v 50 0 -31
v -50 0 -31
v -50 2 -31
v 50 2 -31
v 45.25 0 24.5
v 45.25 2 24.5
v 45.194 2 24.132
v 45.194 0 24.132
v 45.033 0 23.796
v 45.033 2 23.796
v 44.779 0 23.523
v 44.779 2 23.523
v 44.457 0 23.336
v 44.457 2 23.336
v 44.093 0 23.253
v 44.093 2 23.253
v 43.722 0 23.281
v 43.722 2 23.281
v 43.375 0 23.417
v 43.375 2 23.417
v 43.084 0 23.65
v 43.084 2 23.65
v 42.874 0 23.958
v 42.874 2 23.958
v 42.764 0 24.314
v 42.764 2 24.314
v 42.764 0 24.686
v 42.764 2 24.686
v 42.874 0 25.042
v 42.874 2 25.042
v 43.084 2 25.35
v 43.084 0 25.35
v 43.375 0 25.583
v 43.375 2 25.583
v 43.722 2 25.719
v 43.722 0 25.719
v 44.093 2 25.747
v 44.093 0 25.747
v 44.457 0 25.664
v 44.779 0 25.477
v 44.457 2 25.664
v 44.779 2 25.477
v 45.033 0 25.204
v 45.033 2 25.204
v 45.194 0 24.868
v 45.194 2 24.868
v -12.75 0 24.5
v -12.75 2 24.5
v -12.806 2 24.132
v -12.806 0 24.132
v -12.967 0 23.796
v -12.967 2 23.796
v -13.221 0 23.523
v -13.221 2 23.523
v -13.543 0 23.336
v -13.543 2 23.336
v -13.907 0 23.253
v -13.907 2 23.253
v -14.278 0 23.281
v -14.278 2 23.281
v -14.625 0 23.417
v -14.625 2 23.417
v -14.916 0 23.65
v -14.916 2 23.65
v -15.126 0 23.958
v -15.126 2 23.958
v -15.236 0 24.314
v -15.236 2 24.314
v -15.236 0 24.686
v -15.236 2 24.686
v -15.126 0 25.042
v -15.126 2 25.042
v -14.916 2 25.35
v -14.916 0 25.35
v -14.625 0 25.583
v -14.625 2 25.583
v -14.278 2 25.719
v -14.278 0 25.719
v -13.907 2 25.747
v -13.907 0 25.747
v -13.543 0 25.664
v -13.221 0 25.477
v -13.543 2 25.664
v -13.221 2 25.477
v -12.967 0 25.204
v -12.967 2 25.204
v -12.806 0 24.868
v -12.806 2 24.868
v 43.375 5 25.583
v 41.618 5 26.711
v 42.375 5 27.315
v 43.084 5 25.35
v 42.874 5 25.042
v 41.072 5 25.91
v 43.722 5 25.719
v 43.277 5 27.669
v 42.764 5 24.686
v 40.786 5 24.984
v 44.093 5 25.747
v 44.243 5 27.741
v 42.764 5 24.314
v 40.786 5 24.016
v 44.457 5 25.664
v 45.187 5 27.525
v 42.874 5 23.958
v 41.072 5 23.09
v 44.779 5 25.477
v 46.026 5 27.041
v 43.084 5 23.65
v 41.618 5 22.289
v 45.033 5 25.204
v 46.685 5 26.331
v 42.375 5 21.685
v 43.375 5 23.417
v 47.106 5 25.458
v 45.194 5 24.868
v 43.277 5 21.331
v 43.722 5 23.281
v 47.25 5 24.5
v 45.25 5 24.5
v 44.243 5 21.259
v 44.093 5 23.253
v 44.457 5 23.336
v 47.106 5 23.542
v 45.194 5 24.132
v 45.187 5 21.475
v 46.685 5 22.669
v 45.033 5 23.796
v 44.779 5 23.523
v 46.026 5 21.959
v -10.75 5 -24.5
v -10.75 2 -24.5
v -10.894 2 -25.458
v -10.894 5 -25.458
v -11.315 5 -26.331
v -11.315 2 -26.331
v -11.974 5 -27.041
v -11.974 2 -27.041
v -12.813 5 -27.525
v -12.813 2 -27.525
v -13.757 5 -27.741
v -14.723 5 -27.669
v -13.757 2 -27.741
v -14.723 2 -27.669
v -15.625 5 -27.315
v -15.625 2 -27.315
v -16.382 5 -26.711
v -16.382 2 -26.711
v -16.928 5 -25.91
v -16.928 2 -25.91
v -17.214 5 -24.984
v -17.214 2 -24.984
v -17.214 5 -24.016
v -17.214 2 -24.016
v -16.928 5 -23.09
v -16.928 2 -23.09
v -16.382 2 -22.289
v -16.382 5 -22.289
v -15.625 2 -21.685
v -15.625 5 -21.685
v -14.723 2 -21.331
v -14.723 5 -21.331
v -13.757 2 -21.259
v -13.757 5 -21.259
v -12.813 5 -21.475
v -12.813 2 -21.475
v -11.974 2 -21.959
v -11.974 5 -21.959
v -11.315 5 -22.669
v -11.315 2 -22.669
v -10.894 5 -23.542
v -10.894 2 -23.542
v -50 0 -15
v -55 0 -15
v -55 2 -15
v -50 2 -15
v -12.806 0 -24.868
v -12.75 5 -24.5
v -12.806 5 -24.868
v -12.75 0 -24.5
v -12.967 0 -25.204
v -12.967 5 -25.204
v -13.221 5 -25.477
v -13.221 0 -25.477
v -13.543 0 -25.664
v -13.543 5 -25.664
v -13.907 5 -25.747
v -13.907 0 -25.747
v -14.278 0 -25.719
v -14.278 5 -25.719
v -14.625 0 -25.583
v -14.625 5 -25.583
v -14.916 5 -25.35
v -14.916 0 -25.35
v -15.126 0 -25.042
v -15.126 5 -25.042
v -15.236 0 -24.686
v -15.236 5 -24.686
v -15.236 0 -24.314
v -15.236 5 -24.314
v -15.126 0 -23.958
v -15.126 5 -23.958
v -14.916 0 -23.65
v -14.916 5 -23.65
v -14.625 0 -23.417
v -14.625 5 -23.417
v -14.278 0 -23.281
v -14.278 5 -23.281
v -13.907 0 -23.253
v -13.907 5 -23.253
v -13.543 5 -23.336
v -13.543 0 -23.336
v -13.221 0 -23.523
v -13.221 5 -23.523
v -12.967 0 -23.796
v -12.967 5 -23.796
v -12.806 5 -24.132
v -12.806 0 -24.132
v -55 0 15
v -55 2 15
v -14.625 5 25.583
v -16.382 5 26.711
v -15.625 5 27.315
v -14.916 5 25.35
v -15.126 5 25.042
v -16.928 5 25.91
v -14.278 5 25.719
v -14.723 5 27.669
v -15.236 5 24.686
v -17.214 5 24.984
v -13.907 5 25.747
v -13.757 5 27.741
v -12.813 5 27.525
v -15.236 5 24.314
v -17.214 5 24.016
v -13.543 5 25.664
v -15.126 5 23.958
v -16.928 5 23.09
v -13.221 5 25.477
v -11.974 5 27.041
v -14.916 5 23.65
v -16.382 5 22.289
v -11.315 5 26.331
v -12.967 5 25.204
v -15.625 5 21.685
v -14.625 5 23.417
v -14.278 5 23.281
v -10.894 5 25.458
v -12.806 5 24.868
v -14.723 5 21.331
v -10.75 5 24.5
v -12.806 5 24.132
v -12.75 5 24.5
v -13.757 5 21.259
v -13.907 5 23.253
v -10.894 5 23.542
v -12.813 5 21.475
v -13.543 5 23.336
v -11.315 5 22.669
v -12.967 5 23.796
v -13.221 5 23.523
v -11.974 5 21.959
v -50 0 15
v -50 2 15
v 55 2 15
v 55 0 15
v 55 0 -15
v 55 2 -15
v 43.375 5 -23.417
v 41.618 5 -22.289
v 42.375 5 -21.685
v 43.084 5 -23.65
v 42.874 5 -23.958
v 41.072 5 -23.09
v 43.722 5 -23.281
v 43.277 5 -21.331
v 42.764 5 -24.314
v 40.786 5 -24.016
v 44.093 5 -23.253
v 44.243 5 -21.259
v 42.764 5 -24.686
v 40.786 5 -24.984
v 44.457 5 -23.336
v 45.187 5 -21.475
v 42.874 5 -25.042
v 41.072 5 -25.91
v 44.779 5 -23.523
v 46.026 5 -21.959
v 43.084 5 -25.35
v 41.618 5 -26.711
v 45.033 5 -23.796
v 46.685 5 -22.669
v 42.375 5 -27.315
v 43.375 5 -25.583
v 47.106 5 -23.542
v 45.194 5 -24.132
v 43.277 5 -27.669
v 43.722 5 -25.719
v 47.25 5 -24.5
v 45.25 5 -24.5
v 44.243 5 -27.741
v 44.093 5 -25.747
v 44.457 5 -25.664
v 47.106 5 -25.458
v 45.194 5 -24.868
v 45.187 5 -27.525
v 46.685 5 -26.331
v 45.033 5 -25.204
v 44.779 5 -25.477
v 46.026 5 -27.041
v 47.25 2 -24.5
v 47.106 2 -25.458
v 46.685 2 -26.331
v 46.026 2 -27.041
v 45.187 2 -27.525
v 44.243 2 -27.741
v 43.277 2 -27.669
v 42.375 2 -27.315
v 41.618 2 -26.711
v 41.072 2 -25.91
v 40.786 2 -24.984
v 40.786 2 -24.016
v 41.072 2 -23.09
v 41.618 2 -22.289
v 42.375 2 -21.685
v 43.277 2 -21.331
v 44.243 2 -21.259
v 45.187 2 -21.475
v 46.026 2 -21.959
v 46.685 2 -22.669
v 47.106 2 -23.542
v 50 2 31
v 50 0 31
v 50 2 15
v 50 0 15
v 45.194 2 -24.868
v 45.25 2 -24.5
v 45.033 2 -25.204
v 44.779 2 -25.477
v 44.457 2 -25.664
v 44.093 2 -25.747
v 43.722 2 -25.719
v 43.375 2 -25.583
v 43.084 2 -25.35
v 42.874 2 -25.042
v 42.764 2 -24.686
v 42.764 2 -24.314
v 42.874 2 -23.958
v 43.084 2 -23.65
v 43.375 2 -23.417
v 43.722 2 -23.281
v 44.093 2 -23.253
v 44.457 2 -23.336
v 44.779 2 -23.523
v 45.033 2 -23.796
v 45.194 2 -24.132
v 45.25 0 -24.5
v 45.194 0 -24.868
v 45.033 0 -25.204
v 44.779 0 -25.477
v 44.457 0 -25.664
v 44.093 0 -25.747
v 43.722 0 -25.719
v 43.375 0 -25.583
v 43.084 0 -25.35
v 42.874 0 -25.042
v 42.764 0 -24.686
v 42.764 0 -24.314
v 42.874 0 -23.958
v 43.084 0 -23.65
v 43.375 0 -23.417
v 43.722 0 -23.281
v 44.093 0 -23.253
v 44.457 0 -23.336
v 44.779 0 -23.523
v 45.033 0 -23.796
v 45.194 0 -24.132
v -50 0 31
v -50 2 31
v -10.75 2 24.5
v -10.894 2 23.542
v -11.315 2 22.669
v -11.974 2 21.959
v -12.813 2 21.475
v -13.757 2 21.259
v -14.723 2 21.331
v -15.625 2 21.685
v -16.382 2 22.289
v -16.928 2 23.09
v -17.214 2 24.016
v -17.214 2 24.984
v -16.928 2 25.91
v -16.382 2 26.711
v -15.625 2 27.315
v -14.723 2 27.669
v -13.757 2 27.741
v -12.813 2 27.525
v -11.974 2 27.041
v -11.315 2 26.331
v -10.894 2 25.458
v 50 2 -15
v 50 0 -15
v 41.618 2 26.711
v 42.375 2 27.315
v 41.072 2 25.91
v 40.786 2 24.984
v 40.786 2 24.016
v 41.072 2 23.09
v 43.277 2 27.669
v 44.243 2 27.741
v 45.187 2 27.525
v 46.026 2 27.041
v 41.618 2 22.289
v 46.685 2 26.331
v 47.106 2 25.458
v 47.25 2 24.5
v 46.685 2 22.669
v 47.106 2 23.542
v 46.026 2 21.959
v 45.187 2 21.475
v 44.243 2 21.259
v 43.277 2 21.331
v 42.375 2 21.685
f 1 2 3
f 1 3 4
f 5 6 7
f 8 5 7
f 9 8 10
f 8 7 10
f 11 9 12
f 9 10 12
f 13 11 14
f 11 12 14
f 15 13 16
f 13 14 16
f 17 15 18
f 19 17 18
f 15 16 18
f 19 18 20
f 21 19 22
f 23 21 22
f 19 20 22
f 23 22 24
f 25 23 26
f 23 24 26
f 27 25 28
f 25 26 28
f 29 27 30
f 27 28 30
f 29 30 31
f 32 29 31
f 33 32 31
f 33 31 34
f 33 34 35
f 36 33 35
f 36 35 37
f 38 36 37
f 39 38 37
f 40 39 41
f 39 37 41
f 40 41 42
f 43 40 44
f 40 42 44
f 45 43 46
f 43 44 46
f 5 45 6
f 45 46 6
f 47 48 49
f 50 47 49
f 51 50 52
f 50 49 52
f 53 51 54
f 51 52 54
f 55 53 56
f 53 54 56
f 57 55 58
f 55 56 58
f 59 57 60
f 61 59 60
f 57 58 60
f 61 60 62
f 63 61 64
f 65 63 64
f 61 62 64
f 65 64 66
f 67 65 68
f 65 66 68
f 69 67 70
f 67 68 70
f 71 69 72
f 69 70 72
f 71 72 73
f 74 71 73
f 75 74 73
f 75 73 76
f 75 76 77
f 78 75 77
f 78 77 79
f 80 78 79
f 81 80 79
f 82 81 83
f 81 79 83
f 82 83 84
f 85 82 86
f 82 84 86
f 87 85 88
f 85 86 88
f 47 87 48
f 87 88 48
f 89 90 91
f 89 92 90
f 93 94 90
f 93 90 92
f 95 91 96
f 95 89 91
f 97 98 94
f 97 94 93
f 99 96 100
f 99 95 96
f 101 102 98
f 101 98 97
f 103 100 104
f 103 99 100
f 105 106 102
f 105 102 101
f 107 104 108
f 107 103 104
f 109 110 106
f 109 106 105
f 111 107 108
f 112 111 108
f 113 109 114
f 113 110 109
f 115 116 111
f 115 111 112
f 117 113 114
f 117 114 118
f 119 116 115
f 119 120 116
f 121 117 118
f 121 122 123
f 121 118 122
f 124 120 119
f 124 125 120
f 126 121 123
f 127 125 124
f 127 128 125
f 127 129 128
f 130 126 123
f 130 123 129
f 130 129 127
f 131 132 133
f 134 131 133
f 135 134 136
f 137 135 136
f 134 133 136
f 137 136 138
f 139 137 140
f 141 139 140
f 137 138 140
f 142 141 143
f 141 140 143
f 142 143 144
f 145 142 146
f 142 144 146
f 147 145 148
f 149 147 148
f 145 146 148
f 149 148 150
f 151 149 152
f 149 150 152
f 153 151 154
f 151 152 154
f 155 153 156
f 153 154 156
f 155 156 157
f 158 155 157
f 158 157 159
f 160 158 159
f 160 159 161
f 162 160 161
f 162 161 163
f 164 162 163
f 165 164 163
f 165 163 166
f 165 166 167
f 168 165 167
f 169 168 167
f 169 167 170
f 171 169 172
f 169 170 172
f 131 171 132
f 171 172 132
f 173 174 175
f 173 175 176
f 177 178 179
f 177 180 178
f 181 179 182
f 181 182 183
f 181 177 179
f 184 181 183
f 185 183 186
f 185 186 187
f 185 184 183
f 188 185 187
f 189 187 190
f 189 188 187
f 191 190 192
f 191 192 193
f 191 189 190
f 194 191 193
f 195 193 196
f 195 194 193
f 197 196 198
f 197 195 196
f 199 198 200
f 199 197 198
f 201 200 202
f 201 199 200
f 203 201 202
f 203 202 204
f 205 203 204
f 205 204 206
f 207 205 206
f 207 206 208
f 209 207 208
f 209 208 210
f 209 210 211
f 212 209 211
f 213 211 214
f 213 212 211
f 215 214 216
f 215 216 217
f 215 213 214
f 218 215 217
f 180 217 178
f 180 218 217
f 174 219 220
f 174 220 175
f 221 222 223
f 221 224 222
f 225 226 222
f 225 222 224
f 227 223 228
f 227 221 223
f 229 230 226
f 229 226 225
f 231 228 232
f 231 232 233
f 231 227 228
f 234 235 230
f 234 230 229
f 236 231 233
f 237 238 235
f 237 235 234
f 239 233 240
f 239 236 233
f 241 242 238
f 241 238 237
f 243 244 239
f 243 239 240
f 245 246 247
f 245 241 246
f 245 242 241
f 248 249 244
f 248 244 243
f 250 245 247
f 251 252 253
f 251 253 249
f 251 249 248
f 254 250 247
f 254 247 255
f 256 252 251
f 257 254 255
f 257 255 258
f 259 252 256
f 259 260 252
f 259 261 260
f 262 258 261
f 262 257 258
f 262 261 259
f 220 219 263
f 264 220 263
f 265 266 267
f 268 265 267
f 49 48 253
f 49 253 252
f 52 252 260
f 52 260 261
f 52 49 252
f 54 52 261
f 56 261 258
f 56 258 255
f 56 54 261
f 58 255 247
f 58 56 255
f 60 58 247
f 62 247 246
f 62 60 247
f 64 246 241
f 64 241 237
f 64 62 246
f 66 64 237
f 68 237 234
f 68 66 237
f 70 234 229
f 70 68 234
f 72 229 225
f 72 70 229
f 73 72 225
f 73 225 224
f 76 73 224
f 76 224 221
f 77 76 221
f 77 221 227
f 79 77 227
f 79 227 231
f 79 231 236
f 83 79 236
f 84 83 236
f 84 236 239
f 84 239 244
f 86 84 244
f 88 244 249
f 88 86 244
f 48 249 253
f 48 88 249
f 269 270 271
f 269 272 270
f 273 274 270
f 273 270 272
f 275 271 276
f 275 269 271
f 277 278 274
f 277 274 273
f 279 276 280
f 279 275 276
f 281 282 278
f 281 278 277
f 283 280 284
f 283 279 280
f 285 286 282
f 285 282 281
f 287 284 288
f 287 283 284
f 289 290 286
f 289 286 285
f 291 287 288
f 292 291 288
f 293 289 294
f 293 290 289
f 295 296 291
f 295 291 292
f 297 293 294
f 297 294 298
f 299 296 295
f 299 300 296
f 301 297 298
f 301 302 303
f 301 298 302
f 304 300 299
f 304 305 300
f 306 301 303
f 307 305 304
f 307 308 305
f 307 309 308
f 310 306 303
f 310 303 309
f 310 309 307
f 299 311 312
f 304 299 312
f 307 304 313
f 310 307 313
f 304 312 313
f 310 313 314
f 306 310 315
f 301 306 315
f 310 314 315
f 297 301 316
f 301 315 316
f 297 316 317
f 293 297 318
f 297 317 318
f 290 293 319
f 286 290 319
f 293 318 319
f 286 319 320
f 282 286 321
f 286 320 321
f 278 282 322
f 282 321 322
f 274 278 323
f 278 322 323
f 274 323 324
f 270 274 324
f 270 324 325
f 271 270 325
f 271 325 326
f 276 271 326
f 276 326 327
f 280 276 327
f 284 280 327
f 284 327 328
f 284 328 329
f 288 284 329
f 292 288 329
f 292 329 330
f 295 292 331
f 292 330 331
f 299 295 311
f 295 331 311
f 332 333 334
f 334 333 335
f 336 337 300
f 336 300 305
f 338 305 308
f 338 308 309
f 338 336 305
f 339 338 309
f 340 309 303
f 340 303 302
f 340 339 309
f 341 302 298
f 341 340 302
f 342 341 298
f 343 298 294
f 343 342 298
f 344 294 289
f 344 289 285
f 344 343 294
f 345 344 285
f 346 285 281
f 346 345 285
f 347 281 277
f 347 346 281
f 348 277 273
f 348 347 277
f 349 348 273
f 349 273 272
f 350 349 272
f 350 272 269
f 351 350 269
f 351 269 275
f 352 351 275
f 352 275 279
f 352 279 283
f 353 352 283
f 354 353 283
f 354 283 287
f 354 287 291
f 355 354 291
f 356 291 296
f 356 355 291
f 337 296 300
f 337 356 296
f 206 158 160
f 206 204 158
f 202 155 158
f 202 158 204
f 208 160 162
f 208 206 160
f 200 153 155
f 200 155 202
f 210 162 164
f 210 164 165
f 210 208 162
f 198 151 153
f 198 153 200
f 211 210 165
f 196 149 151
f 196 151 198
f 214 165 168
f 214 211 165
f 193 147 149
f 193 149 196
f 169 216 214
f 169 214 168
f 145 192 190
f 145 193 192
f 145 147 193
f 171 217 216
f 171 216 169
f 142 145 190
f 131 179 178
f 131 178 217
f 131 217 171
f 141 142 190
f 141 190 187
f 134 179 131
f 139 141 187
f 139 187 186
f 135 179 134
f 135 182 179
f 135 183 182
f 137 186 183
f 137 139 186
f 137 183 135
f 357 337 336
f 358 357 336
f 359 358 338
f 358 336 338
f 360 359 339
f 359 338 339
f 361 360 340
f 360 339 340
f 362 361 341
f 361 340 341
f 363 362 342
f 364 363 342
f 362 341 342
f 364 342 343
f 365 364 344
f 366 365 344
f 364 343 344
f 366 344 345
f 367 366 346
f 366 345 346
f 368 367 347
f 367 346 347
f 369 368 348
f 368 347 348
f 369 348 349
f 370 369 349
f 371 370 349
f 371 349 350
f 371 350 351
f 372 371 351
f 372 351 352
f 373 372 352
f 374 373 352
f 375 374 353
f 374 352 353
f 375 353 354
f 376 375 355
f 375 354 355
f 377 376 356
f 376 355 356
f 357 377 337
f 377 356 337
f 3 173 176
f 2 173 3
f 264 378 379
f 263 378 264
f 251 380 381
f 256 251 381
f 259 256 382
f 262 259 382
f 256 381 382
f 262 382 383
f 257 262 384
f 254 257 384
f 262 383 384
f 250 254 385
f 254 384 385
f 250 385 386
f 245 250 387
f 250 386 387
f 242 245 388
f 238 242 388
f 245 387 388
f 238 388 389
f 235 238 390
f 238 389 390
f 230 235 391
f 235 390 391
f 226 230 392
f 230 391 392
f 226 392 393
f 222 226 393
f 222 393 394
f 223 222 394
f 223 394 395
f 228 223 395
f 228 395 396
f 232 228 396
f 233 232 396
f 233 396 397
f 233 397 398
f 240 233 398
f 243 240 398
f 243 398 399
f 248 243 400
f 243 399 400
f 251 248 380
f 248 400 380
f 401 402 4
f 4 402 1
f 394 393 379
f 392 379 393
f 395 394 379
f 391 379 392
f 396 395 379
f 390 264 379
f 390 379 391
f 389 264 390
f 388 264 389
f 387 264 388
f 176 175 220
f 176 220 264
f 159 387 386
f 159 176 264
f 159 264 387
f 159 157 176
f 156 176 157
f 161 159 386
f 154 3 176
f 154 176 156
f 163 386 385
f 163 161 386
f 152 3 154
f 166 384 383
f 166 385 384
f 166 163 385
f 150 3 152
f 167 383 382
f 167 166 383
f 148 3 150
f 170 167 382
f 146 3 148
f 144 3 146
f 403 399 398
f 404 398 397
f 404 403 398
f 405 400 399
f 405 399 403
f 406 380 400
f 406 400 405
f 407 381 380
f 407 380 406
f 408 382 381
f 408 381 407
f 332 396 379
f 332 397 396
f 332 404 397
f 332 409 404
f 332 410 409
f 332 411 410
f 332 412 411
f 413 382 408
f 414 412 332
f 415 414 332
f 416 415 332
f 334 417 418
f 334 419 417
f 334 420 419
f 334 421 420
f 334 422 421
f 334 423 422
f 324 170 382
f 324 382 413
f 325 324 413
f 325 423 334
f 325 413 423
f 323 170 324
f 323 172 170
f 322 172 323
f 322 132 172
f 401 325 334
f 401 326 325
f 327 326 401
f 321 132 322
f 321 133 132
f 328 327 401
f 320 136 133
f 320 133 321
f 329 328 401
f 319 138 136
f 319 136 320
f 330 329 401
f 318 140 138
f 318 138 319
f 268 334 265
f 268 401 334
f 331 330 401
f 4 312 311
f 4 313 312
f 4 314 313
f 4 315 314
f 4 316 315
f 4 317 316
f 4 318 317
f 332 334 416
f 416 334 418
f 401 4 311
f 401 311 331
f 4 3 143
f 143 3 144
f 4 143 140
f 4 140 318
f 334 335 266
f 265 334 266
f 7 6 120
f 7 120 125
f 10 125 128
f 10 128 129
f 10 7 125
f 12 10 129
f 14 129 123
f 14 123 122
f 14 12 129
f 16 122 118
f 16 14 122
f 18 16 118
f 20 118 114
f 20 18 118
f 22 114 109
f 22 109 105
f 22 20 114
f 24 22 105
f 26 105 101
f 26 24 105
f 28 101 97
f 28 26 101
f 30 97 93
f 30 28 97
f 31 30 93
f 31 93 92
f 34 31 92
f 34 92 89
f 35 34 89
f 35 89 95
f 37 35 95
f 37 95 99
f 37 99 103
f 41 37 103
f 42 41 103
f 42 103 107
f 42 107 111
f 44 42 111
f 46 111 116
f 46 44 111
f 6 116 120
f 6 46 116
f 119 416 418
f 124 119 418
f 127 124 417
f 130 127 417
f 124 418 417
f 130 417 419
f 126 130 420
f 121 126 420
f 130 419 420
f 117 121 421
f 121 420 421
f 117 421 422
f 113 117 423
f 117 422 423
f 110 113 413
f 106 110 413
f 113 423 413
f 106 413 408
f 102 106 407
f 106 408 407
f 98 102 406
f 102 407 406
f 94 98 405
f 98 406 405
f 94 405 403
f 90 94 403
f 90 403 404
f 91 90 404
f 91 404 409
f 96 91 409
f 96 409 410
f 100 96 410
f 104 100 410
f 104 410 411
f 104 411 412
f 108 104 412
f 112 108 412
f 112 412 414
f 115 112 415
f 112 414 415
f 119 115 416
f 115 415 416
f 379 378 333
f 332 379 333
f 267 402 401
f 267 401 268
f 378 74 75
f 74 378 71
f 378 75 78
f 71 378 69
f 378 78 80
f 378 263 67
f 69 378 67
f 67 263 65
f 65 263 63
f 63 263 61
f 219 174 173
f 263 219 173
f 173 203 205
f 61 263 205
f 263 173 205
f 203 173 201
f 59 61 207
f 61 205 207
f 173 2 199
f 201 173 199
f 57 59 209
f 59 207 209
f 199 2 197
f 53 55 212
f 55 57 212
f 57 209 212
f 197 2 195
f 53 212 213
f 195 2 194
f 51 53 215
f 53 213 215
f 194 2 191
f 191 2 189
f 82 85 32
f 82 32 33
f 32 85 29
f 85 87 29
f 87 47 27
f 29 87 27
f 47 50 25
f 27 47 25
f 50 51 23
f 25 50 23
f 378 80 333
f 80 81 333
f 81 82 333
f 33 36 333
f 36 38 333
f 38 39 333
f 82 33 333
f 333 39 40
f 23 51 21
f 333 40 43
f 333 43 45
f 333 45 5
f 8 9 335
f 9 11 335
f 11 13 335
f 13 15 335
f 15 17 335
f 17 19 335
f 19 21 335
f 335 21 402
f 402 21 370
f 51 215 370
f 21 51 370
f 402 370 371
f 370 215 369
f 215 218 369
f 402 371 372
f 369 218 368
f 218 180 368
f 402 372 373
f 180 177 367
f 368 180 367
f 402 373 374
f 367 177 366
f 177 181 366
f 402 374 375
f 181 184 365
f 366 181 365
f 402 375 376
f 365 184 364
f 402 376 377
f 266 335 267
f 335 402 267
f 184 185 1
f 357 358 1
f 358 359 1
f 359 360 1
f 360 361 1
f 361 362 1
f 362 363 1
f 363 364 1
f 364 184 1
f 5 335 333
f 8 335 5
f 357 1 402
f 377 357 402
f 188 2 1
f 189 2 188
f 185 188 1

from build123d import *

# Parameters (mm, degrees)
SKETCH_1_W            = 100
SKETCH_1_H            = 62
SKETCH_1_W_2          = 110
SKETCH_1_H_2          = 30
EXTRUDE_467_DEPTH     = 2
SKETCH_2_R            = 1.25
CUT_EXTRUDE_872_DEPTH = 2
SKETCH_3_R            = 3.25
SKETCH_3_R_2          = 1.25
EXTRUDE_1188_DEPTH    = 3


with BuildPart() as part:
    # 草图1 → Extrude 467 (new body)
    with BuildSketch(Plane(origin=(0, 0, 0), x_dir=(1, 0, 0), z_dir=(0, 1, 0))):
        Rectangle(SKETCH_1_W, SKETCH_1_H)
        Rectangle(SKETCH_1_W_2, SKETCH_1_H_2)
    extrude(amount=EXTRUDE_467_DEPTH)

    # 草图2 → Cut-Extrude 872 (cut)
    with BuildSketch(Plane(origin=(0, 2, 0), x_dir=(1, 0, 0), z_dir=(0, 1, 0))):
        with Locations((-14, 24.5)):
            Circle(SKETCH_2_R)
        with Locations((44, 24.5)):
            Circle(SKETCH_2_R)
        with Locations((-14, -24.5)):
            Circle(SKETCH_2_R)
        with Locations((44, -24.5)):
            Circle(SKETCH_2_R)
    extrude(amount=-CUT_EXTRUDE_872_DEPTH, mode=Mode.SUBTRACT)

    # 草图3 → Extrude 1188 (add)
    with BuildSketch(Plane(origin=(0, 2, 0), x_dir=(1, 0, 0), z_dir=(0, 1, 0))):
        with Locations((-14, 24.5)):
            Circle(SKETCH_3_R)
        with Locations((-14, 24.5)):
            Circle(SKETCH_3_R_2, mode=Mode.SUBTRACT)
        with Locations((44, 24.5)):
            Circle(SKETCH_3_R)
        with Locations((44, 24.5)):
            Circle(SKETCH_3_R_2, mode=Mode.SUBTRACT)
        with Locations((-14, -24.5)):
            Circle(SKETCH_3_R)
        with Locations((-14, -24.5)):
            Circle(SKETCH_3_R_2, mode=Mode.SUBTRACT)
        with Locations((44, -24.5)):
            Circle(SKETCH_3_R)
        with Locations((44, -24.5)):
            Circle(SKETCH_3_R_2, mode=Mode.SUBTRACT)
    extrude(amount=EXTRUDE_1188_DEPTH)


solid = part.part
